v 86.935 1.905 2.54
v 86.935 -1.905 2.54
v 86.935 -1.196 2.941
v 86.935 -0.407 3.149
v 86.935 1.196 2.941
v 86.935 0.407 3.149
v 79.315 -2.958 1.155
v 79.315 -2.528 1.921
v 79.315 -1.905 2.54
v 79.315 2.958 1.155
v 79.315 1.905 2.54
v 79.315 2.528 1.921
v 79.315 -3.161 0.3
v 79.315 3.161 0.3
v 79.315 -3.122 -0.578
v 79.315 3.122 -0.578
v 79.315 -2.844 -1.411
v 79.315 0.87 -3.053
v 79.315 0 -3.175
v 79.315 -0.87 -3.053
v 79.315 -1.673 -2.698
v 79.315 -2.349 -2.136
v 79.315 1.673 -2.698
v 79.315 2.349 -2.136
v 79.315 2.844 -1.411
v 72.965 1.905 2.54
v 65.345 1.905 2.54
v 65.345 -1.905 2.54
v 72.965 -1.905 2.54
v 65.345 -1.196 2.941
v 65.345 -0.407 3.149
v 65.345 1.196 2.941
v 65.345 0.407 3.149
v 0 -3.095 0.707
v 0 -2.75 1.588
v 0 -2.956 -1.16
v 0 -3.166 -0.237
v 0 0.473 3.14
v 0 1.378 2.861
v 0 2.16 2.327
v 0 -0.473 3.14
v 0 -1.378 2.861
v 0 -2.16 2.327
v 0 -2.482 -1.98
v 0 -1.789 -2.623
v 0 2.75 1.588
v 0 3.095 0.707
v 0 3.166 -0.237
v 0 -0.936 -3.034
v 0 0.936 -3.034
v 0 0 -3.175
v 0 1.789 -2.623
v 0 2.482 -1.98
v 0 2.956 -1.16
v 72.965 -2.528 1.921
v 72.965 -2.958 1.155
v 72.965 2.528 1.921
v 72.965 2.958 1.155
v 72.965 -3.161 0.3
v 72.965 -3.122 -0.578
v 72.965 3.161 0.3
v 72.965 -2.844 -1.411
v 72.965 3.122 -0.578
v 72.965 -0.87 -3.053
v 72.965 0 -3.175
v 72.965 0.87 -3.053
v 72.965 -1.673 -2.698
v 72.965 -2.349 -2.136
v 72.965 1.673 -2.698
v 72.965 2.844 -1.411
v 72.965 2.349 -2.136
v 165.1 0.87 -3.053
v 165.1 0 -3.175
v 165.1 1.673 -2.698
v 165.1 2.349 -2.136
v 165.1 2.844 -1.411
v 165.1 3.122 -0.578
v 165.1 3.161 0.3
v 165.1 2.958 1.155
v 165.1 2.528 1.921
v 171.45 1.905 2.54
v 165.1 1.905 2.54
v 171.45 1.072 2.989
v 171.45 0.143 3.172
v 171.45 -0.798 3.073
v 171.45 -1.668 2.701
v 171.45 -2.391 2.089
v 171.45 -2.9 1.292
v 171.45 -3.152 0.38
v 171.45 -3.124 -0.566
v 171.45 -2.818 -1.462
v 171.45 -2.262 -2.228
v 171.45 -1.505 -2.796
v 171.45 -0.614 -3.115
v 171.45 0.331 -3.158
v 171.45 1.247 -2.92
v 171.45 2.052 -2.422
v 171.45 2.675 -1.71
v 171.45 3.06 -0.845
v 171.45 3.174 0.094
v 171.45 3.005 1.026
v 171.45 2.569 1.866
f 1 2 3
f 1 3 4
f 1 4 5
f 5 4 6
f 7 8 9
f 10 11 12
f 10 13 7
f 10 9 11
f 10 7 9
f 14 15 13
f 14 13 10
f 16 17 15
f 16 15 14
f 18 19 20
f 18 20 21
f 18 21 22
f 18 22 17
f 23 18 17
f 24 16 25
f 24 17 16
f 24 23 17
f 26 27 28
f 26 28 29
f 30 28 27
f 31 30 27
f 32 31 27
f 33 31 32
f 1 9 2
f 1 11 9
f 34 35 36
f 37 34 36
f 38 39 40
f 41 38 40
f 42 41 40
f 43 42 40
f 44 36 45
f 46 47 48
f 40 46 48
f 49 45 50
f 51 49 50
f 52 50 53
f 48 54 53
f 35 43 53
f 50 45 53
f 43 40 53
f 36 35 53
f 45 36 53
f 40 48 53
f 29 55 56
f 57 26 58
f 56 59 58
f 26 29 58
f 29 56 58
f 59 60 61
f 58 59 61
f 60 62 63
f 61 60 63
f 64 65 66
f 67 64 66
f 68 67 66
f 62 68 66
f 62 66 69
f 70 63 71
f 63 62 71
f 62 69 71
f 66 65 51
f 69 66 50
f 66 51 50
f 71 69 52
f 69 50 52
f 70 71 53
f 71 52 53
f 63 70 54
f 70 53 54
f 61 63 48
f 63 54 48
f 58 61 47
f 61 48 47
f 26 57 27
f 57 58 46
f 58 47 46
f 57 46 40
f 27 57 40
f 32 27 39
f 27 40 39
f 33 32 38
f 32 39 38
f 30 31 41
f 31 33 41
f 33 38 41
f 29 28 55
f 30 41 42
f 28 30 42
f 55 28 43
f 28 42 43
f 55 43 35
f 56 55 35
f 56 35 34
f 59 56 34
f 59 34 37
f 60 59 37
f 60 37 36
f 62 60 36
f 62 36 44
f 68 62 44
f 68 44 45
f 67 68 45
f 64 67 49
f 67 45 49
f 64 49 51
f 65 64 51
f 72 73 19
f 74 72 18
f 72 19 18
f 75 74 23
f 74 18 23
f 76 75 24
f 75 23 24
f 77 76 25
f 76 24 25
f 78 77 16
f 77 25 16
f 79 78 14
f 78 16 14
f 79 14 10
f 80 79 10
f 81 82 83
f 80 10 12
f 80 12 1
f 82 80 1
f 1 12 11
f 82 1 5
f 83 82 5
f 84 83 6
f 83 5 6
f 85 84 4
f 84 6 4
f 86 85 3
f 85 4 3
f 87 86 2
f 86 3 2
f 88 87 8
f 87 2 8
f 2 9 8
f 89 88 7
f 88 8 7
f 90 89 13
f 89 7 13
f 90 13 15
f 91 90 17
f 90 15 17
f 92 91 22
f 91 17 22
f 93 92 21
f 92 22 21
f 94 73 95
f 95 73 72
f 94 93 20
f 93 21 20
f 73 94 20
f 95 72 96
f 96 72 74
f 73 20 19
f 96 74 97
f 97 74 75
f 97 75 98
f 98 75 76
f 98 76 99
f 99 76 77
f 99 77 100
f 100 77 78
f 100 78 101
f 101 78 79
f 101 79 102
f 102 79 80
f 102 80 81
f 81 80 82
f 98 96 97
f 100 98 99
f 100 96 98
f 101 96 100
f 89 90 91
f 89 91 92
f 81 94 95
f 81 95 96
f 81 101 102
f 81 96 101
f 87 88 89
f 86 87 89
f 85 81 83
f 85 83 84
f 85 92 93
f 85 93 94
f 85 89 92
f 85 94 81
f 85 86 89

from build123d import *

# Parameters (mm, degrees)
SKETCH1_R               = 3.175
BOSS_EXTRUDE1_DEPTH     = 165.1
CUT_EXTRUDE1_DEPTH      = 166.161046406
CUT_EXTRUDE1_DEPTH_BACK = 166.161046406
SKETCH2_W               = 6.35
SKETCH2_H               = 14.816322072
SKETCH3_W               = 21.59
SKETCH3_H               = 10.879828445
CUT_EXTRUDE2_DEPTH      = 12.954
SKETCH4_R               = 3.175
BOSS_EXTRUDE2_DEPTH     = 6.35


with BuildPart() as part:
    # Sketch1 → Boss-Extrude1 (new body)
    with BuildSketch(Plane(origin=(0, 0, 0), x_dir=(0, 0, -1), z_dir=(1, 0, 0))):
        Circle(SKETCH1_R)
    extrude(amount=BOSS_EXTRUDE1_DEPTH)

    # Sketch2 → Cut-Extrude1 (cut, two sides: drawn at the far end of the back side and taken through both)
    with BuildSketch(Plane.XY.offset(-CUT_EXTRUDE1_DEPTH_BACK)):
        with Locations((76.139978718, 0.386933618)):
            Rectangle(SKETCH2_W, SKETCH2_H)
    extrude(amount=CUT_EXTRUDE1_DEPTH + CUT_EXTRUDE1_DEPTH_BACK, mode=Mode.SUBTRACT)


with BuildPart() as cut_extrude1_piece_1:
    # of the separate pieces the step leaves, piece 1, a body of its own (cut_extrude1_pieces)
    add(part.part.solids().sort_by_distance((79.314978718, 0, -3.175))[0])


with BuildPart() as cut_extrude1_piece_2:
    # of the separate pieces the step leaves, piece 2, a body of its own (cut_extrude1_pieces)
    add(part.part.solids().sort_by_distance((0, 0, -3.175))[0])


with BuildPart() as cut_extrude2_tool:
    # Sketch3 → Cut-Extrude2 (new body)
    with BuildSketch(Plane.XY.offset(2.54)):
        with Locations((76.139978718, 0.388956266)):
            Rectangle(SKETCH3_W, SKETCH3_H)
    extrude(amount=CUT_EXTRUDE2_DEPTH)


with BuildPart() as cut_extrude1_piece_1_1:
    add(cut_extrude1_piece_1.part)

    # Cut-Extrude2: cut by cut_extrude2_tool
    add(cut_extrude2_tool.part, mode=Mode.SUBTRACT)

    # Sketch4 → Boss-Extrude2 (add)
    with BuildSketch(Plane(origin=(165.1, 0, 0), x_dir=(0, 0, -1), z_dir=(1, 0, 0))):
        with Locations(Location((0, 0, 0), (0, 0, 143.130102354))):
            Circle(SKETCH4_R)
    extrude(amount=BOSS_EXTRUDE2_DEPTH)


with BuildPart() as cut_extrude1_piece_2_1:
    add(cut_extrude1_piece_2.part)

    # Cut-Extrude2: cut by cut_extrude2_tool
    add(cut_extrude2_tool.part, mode=Mode.SUBTRACT)


solid = Compound([cut_extrude1_piece_1_1.part, cut_extrude1_piece_2_1.part])
